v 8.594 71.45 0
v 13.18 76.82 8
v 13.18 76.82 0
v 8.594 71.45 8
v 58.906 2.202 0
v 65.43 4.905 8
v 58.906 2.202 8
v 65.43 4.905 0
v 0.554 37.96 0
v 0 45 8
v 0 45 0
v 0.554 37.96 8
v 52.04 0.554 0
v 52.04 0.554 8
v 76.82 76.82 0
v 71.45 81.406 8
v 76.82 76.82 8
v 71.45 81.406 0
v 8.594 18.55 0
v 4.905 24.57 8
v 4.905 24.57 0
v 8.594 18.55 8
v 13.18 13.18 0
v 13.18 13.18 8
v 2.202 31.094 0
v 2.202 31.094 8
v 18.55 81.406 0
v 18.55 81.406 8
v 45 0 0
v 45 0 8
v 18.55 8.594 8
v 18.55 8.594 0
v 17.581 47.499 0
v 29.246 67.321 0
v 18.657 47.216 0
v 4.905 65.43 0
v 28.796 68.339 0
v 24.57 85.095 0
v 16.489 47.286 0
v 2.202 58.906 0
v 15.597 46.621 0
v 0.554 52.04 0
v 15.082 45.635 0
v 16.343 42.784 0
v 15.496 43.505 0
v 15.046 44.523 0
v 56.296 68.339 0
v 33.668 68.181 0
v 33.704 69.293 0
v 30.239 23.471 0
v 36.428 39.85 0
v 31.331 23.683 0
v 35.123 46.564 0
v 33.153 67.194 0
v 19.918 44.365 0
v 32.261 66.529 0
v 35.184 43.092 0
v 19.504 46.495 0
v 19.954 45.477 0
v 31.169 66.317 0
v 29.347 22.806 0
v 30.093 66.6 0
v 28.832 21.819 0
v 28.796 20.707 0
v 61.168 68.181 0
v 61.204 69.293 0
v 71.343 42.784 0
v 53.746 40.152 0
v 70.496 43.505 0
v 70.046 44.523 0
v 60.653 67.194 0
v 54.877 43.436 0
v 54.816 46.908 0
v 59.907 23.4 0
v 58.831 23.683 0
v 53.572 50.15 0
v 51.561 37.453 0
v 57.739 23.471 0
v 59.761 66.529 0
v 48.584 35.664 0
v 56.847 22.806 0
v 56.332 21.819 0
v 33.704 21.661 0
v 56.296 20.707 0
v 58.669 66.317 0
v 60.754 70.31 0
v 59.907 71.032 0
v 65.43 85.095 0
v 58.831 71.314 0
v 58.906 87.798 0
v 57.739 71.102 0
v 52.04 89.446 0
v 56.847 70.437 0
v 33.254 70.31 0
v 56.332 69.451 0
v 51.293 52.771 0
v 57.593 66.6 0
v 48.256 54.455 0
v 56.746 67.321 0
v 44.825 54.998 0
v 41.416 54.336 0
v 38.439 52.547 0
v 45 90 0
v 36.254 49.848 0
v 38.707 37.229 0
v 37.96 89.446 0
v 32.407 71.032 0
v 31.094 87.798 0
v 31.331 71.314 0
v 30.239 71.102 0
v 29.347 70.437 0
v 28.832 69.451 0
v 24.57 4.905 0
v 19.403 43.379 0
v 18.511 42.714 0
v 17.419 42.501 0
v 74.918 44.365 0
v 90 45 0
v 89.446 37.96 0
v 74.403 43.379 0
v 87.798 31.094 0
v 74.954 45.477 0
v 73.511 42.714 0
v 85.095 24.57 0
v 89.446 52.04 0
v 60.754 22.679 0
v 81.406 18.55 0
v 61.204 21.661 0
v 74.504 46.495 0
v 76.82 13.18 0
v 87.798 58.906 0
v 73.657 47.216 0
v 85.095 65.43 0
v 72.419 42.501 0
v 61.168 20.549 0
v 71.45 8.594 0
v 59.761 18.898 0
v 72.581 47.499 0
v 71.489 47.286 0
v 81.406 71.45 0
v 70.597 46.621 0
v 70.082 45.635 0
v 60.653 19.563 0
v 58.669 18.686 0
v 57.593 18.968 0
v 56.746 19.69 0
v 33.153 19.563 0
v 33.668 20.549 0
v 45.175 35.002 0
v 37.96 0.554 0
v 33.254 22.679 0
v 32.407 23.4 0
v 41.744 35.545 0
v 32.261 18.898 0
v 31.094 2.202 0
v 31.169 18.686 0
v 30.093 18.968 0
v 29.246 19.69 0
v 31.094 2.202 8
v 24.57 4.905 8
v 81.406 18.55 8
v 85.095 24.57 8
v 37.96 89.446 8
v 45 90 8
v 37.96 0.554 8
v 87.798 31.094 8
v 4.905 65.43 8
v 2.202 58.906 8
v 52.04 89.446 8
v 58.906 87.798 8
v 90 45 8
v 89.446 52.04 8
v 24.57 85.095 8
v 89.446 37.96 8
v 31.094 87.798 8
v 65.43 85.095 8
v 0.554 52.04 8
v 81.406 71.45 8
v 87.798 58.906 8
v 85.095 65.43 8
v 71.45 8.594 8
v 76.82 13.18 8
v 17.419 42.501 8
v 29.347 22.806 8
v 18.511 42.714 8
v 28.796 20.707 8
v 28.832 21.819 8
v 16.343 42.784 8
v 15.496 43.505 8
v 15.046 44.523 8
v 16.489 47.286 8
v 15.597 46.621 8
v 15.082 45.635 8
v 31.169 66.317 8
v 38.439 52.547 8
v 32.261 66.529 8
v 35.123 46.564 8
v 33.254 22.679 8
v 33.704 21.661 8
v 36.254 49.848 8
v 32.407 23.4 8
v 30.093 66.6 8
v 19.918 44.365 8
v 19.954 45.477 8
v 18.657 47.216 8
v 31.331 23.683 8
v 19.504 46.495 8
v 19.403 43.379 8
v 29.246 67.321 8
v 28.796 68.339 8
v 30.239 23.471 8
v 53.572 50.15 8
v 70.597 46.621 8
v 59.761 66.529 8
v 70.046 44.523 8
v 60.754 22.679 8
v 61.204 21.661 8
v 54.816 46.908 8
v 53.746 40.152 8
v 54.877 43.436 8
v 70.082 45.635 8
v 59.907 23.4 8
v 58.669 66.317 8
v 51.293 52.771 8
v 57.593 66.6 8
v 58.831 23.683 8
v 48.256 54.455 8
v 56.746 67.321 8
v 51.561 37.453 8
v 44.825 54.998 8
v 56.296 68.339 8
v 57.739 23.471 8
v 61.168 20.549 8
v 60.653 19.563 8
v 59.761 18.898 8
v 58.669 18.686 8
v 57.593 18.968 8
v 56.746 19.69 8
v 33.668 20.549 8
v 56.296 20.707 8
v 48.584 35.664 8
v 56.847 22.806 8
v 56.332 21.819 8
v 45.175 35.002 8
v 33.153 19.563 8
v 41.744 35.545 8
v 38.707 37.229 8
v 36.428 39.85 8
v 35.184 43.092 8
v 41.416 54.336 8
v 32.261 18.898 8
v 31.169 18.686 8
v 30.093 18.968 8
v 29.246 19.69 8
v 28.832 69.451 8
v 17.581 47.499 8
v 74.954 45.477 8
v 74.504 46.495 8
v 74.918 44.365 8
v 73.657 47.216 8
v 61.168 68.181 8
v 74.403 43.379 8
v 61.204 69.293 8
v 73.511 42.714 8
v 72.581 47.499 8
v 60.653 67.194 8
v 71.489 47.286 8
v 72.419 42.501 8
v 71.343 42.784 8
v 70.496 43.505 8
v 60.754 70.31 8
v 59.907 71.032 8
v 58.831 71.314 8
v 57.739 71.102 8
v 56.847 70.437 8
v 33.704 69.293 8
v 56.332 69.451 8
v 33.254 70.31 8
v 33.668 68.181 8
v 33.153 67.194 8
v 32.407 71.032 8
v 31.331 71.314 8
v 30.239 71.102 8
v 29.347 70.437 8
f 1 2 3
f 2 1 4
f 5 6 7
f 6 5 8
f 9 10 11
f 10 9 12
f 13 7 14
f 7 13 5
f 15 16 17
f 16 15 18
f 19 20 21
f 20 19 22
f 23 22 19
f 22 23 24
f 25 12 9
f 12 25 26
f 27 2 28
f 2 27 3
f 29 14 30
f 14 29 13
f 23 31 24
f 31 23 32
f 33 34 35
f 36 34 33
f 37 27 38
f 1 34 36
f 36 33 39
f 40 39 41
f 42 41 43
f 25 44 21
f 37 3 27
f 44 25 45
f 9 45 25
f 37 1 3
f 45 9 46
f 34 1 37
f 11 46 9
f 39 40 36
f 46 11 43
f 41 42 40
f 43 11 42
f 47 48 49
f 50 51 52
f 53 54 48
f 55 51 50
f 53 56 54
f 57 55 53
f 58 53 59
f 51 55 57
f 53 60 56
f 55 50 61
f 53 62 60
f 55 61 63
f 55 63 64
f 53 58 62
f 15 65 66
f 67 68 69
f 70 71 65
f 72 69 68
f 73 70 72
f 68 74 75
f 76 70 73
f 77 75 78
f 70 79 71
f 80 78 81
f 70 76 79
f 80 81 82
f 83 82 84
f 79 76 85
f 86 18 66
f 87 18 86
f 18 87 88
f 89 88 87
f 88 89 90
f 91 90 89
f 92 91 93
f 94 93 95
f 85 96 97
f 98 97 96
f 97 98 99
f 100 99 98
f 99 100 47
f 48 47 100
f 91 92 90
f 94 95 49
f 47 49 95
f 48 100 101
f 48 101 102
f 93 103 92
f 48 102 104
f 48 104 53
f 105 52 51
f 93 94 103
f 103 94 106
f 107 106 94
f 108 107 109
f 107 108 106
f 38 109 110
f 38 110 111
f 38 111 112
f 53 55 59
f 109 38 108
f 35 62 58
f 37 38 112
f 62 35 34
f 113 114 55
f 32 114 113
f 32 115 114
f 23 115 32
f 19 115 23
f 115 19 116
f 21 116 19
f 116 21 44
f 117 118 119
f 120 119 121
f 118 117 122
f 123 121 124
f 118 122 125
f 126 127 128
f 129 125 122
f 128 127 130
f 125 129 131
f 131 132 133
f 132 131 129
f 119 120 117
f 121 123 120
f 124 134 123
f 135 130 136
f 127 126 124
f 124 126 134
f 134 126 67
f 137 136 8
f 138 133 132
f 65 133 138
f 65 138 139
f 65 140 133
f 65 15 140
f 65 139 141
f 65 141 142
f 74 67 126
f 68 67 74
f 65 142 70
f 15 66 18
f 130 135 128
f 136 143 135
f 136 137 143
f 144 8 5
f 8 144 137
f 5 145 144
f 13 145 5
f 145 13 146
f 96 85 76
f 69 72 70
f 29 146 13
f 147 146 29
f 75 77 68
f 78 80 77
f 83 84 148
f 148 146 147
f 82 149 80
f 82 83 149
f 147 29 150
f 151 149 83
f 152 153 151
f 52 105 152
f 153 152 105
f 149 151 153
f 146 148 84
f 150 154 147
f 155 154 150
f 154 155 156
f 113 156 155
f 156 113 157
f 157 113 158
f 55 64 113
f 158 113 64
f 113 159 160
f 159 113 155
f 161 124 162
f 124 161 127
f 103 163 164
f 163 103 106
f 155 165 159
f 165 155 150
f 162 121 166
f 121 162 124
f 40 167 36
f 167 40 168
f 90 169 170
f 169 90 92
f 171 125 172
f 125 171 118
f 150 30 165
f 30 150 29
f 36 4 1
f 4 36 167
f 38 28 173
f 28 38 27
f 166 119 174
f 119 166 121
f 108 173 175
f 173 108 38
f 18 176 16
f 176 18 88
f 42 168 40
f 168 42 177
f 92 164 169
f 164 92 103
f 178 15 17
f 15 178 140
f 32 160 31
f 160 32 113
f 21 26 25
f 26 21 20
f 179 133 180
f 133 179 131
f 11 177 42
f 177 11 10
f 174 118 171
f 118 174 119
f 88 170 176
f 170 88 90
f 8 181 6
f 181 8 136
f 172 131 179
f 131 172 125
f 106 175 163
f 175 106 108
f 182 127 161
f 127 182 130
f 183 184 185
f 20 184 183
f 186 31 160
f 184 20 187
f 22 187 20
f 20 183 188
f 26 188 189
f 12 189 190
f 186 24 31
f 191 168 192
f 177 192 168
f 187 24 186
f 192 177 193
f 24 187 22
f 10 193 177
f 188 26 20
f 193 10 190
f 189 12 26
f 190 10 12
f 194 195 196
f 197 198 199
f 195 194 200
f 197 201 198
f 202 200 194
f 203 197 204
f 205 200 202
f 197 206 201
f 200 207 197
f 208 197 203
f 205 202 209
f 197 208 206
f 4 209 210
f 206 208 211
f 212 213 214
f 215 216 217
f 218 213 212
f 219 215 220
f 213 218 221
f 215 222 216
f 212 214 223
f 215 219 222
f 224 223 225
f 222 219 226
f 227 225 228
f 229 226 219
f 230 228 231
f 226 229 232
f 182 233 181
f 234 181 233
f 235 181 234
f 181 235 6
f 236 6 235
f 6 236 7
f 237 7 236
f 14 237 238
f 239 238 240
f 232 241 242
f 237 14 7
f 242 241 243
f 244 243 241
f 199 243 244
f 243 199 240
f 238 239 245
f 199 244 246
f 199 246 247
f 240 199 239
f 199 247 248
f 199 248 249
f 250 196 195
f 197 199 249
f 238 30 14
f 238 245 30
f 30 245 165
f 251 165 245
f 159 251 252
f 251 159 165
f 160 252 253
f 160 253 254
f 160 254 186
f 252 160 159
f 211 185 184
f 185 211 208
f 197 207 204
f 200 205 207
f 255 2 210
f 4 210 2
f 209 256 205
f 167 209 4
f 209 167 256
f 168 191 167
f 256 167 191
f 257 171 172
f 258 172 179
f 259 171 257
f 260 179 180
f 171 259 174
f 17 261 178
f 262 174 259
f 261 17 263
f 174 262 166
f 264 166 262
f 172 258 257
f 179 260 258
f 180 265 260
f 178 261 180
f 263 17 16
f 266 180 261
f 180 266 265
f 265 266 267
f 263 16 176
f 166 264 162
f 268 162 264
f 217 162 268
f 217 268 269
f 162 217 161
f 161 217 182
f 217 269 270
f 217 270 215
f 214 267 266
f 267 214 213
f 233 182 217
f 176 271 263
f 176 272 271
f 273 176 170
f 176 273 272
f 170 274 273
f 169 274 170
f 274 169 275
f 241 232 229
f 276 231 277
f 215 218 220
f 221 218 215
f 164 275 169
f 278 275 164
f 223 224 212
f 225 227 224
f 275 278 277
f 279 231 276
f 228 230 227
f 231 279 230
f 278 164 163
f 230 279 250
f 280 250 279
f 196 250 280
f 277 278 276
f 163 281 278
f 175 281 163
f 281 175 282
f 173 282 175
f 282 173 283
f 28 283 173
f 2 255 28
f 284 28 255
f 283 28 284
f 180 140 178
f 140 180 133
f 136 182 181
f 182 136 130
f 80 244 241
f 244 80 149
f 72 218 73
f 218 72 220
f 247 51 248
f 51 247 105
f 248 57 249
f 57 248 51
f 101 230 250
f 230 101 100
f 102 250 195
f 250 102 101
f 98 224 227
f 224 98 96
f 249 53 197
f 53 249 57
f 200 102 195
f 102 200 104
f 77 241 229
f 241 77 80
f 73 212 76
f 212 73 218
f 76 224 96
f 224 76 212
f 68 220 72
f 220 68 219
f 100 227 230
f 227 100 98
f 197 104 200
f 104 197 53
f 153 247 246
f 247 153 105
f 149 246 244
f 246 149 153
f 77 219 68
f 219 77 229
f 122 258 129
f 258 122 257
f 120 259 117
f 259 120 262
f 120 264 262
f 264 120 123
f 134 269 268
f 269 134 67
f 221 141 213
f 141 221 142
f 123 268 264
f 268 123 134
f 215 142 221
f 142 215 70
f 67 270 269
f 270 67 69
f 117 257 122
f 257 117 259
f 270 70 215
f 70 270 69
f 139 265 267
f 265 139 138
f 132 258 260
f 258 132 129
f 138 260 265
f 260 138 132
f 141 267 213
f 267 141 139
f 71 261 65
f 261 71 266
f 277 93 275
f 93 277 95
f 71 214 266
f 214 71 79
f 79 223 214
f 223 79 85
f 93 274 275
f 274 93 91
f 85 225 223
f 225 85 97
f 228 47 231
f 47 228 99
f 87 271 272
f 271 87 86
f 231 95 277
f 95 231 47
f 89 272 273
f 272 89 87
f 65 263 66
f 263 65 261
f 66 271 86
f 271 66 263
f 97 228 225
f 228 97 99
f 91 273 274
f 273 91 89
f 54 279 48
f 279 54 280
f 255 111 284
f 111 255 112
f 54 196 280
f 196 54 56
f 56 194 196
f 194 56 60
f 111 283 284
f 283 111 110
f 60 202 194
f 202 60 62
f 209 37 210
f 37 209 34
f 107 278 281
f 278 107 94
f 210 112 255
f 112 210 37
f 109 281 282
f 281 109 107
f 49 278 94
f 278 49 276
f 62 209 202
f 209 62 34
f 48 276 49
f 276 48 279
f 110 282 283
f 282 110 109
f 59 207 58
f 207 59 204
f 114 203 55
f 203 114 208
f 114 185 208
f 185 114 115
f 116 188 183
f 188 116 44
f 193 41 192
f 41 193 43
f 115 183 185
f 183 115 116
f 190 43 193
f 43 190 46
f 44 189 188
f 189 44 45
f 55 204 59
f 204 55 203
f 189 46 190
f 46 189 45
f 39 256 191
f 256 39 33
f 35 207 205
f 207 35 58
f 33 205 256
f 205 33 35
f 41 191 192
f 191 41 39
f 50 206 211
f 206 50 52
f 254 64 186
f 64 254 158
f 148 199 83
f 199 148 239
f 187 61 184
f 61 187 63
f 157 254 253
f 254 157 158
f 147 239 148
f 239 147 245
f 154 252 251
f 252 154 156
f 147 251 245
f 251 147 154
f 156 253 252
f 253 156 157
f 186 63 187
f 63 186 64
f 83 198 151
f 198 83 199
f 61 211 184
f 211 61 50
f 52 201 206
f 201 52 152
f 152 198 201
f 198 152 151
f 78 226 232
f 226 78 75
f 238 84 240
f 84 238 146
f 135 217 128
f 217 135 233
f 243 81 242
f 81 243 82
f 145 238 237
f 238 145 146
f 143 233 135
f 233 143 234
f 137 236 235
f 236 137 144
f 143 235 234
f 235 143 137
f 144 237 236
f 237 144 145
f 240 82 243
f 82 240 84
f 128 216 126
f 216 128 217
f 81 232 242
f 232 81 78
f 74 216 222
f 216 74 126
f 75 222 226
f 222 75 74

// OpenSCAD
$fn = 32;

// ----------------------------------------------------------------------
// Spacer plate: round flange R45, 6 bolts
// ----------------------------------------------------------------------

// --- parameters (mm) ---
bore_r = 10;              // centre bore radius
bolt_r = 2.5;             // bolt hole radius
plate_t = 8;              // plate thickness, Z (extrusion height)
flange_r = 45;            // flange radius
n_bolt = 6;               // bolt hole count
ring_r = 27.5;            // bolt circle radius

profile = [[90, 45], [89.446, 52.04], [87.798, 58.906], [85.095, 65.43], [81.406, 71.45], [76.82, 76.82], [71.45, 81.406], [65.43, 85.095], [58.906, 87.798], [52.04, 89.446], [45, 90], [37.96, 89.446], [31.094, 87.798], [24.57, 85.095], [18.55, 81.406], [13.18, 76.82], [8.594, 71.45], [4.905, 65.43], [2.202, 58.906], [0.554, 52.04], [0, 45], [0.554, 37.96], [2.202, 31.094], [4.905, 24.57], [8.594, 18.55], [13.18, 13.18], [18.55, 8.594], [24.57, 4.905], [31.094, 2.202], [37.96, 0.554], [45, 0], [52.04, 0.554], [58.906, 2.202], [65.43, 4.905], [71.45, 8.594], [76.82, 13.18], [81.406, 18.55], [85.095, 24.57], [87.798, 31.094], [89.446, 37.96]];  // primary outline, 40 points, counter clockwise
void_1 = [[54.816, 46.908], [53.572, 50.15], [51.293, 52.771], [48.256, 54.455], [44.825, 54.998], [41.416, 54.336], [38.439, 52.547], [36.254, 49.848], [35.123, 46.564], [35.184, 43.092], [36.428, 39.85], [38.707, 37.229], [41.744, 35.545], [45.175, 35.002], [48.584, 35.664], [51.561, 37.453], [53.746, 40.152], [54.877, 43.436]];  // centre bore, 18 points
void_2 = [[74.954, 45.477], [74.504, 46.495], [73.657, 47.216], [72.581, 47.499], [71.489, 47.286], [70.597, 46.621], [70.082, 45.635], [70.046, 44.523], [70.496, 43.505], [71.343, 42.784], [72.419, 42.501], [73.511, 42.714], [74.403, 43.379], [74.918, 44.365]];  // bolt hole 1, 14 points
void_3 = [[61.204, 69.293], [60.754, 70.31], [59.907, 71.032], [58.831, 71.314], [57.739, 71.102], [56.847, 70.437], [56.332, 69.451], [56.296, 68.339], [56.746, 67.321], [57.593, 66.6], [58.669, 66.317], [59.761, 66.529], [60.653, 67.194], [61.168, 68.181]];  // bolt hole 2, 14 points
void_4 = [[33.704, 69.293], [33.254, 70.31], [32.407, 71.032], [31.331, 71.314], [30.239, 71.102], [29.347, 70.437], [28.832, 69.451], [28.796, 68.339], [29.246, 67.321], [30.093, 66.6], [31.169, 66.317], [32.261, 66.529], [33.153, 67.194], [33.668, 68.181]];  // bolt hole 3, 14 points
void_5 = [[19.954, 45.477], [19.504, 46.495], [18.657, 47.216], [17.581, 47.499], [16.489, 47.286], [15.597, 46.621], [15.082, 45.635], [15.046, 44.523], [15.496, 43.505], [16.343, 42.784], [17.419, 42.501], [18.511, 42.714], [19.403, 43.379], [19.918, 44.365]];  // bolt hole 4, 14 points
void_6 = [[33.704, 21.661], [33.254, 22.679], [32.407, 23.4], [31.331, 23.683], [30.239, 23.471], [29.347, 22.806], [28.832, 21.819], [28.796, 20.707], [29.246, 19.69], [30.093, 18.968], [31.169, 18.686], [32.261, 18.898], [33.153, 19.563], [33.668, 20.549]];  // bolt hole 5, 14 points
void_7 = [[61.204, 21.661], [60.754, 22.679], [59.907, 23.4], [58.831, 23.683], [57.739, 23.471], [56.847, 22.806], [56.332, 21.819], [56.296, 20.707], [56.746, 19.69], [57.593, 18.968], [58.669, 18.686], [59.761, 18.898], [60.653, 19.563], [61.168, 20.549]];  // bolt hole 6, 14 points

// --- the one profile operation ---
difference() {
  linear_extrude(height = plate_t) polygon(points = profile);
  translate([0, 0, -1])
    linear_extrude(height = plate_t + 2) polygon(points = void_1);
  translate([0, 0, -1])
    linear_extrude(height = plate_t + 2) polygon(points = void_2);
  translate([0, 0, -1])
    linear_extrude(height = plate_t + 2) polygon(points = void_3);
  translate([0, 0, -1])
    linear_extrude(height = plate_t + 2) polygon(points = void_4);
  translate([0, 0, -1])
    linear_extrude(height = plate_t + 2) polygon(points = void_5);
  translate([0, 0, -1])
    linear_extrude(height = plate_t + 2) polygon(points = void_6);
  translate([0, 0, -1])
    linear_extrude(height = plate_t + 2) polygon(points = void_7);
}
